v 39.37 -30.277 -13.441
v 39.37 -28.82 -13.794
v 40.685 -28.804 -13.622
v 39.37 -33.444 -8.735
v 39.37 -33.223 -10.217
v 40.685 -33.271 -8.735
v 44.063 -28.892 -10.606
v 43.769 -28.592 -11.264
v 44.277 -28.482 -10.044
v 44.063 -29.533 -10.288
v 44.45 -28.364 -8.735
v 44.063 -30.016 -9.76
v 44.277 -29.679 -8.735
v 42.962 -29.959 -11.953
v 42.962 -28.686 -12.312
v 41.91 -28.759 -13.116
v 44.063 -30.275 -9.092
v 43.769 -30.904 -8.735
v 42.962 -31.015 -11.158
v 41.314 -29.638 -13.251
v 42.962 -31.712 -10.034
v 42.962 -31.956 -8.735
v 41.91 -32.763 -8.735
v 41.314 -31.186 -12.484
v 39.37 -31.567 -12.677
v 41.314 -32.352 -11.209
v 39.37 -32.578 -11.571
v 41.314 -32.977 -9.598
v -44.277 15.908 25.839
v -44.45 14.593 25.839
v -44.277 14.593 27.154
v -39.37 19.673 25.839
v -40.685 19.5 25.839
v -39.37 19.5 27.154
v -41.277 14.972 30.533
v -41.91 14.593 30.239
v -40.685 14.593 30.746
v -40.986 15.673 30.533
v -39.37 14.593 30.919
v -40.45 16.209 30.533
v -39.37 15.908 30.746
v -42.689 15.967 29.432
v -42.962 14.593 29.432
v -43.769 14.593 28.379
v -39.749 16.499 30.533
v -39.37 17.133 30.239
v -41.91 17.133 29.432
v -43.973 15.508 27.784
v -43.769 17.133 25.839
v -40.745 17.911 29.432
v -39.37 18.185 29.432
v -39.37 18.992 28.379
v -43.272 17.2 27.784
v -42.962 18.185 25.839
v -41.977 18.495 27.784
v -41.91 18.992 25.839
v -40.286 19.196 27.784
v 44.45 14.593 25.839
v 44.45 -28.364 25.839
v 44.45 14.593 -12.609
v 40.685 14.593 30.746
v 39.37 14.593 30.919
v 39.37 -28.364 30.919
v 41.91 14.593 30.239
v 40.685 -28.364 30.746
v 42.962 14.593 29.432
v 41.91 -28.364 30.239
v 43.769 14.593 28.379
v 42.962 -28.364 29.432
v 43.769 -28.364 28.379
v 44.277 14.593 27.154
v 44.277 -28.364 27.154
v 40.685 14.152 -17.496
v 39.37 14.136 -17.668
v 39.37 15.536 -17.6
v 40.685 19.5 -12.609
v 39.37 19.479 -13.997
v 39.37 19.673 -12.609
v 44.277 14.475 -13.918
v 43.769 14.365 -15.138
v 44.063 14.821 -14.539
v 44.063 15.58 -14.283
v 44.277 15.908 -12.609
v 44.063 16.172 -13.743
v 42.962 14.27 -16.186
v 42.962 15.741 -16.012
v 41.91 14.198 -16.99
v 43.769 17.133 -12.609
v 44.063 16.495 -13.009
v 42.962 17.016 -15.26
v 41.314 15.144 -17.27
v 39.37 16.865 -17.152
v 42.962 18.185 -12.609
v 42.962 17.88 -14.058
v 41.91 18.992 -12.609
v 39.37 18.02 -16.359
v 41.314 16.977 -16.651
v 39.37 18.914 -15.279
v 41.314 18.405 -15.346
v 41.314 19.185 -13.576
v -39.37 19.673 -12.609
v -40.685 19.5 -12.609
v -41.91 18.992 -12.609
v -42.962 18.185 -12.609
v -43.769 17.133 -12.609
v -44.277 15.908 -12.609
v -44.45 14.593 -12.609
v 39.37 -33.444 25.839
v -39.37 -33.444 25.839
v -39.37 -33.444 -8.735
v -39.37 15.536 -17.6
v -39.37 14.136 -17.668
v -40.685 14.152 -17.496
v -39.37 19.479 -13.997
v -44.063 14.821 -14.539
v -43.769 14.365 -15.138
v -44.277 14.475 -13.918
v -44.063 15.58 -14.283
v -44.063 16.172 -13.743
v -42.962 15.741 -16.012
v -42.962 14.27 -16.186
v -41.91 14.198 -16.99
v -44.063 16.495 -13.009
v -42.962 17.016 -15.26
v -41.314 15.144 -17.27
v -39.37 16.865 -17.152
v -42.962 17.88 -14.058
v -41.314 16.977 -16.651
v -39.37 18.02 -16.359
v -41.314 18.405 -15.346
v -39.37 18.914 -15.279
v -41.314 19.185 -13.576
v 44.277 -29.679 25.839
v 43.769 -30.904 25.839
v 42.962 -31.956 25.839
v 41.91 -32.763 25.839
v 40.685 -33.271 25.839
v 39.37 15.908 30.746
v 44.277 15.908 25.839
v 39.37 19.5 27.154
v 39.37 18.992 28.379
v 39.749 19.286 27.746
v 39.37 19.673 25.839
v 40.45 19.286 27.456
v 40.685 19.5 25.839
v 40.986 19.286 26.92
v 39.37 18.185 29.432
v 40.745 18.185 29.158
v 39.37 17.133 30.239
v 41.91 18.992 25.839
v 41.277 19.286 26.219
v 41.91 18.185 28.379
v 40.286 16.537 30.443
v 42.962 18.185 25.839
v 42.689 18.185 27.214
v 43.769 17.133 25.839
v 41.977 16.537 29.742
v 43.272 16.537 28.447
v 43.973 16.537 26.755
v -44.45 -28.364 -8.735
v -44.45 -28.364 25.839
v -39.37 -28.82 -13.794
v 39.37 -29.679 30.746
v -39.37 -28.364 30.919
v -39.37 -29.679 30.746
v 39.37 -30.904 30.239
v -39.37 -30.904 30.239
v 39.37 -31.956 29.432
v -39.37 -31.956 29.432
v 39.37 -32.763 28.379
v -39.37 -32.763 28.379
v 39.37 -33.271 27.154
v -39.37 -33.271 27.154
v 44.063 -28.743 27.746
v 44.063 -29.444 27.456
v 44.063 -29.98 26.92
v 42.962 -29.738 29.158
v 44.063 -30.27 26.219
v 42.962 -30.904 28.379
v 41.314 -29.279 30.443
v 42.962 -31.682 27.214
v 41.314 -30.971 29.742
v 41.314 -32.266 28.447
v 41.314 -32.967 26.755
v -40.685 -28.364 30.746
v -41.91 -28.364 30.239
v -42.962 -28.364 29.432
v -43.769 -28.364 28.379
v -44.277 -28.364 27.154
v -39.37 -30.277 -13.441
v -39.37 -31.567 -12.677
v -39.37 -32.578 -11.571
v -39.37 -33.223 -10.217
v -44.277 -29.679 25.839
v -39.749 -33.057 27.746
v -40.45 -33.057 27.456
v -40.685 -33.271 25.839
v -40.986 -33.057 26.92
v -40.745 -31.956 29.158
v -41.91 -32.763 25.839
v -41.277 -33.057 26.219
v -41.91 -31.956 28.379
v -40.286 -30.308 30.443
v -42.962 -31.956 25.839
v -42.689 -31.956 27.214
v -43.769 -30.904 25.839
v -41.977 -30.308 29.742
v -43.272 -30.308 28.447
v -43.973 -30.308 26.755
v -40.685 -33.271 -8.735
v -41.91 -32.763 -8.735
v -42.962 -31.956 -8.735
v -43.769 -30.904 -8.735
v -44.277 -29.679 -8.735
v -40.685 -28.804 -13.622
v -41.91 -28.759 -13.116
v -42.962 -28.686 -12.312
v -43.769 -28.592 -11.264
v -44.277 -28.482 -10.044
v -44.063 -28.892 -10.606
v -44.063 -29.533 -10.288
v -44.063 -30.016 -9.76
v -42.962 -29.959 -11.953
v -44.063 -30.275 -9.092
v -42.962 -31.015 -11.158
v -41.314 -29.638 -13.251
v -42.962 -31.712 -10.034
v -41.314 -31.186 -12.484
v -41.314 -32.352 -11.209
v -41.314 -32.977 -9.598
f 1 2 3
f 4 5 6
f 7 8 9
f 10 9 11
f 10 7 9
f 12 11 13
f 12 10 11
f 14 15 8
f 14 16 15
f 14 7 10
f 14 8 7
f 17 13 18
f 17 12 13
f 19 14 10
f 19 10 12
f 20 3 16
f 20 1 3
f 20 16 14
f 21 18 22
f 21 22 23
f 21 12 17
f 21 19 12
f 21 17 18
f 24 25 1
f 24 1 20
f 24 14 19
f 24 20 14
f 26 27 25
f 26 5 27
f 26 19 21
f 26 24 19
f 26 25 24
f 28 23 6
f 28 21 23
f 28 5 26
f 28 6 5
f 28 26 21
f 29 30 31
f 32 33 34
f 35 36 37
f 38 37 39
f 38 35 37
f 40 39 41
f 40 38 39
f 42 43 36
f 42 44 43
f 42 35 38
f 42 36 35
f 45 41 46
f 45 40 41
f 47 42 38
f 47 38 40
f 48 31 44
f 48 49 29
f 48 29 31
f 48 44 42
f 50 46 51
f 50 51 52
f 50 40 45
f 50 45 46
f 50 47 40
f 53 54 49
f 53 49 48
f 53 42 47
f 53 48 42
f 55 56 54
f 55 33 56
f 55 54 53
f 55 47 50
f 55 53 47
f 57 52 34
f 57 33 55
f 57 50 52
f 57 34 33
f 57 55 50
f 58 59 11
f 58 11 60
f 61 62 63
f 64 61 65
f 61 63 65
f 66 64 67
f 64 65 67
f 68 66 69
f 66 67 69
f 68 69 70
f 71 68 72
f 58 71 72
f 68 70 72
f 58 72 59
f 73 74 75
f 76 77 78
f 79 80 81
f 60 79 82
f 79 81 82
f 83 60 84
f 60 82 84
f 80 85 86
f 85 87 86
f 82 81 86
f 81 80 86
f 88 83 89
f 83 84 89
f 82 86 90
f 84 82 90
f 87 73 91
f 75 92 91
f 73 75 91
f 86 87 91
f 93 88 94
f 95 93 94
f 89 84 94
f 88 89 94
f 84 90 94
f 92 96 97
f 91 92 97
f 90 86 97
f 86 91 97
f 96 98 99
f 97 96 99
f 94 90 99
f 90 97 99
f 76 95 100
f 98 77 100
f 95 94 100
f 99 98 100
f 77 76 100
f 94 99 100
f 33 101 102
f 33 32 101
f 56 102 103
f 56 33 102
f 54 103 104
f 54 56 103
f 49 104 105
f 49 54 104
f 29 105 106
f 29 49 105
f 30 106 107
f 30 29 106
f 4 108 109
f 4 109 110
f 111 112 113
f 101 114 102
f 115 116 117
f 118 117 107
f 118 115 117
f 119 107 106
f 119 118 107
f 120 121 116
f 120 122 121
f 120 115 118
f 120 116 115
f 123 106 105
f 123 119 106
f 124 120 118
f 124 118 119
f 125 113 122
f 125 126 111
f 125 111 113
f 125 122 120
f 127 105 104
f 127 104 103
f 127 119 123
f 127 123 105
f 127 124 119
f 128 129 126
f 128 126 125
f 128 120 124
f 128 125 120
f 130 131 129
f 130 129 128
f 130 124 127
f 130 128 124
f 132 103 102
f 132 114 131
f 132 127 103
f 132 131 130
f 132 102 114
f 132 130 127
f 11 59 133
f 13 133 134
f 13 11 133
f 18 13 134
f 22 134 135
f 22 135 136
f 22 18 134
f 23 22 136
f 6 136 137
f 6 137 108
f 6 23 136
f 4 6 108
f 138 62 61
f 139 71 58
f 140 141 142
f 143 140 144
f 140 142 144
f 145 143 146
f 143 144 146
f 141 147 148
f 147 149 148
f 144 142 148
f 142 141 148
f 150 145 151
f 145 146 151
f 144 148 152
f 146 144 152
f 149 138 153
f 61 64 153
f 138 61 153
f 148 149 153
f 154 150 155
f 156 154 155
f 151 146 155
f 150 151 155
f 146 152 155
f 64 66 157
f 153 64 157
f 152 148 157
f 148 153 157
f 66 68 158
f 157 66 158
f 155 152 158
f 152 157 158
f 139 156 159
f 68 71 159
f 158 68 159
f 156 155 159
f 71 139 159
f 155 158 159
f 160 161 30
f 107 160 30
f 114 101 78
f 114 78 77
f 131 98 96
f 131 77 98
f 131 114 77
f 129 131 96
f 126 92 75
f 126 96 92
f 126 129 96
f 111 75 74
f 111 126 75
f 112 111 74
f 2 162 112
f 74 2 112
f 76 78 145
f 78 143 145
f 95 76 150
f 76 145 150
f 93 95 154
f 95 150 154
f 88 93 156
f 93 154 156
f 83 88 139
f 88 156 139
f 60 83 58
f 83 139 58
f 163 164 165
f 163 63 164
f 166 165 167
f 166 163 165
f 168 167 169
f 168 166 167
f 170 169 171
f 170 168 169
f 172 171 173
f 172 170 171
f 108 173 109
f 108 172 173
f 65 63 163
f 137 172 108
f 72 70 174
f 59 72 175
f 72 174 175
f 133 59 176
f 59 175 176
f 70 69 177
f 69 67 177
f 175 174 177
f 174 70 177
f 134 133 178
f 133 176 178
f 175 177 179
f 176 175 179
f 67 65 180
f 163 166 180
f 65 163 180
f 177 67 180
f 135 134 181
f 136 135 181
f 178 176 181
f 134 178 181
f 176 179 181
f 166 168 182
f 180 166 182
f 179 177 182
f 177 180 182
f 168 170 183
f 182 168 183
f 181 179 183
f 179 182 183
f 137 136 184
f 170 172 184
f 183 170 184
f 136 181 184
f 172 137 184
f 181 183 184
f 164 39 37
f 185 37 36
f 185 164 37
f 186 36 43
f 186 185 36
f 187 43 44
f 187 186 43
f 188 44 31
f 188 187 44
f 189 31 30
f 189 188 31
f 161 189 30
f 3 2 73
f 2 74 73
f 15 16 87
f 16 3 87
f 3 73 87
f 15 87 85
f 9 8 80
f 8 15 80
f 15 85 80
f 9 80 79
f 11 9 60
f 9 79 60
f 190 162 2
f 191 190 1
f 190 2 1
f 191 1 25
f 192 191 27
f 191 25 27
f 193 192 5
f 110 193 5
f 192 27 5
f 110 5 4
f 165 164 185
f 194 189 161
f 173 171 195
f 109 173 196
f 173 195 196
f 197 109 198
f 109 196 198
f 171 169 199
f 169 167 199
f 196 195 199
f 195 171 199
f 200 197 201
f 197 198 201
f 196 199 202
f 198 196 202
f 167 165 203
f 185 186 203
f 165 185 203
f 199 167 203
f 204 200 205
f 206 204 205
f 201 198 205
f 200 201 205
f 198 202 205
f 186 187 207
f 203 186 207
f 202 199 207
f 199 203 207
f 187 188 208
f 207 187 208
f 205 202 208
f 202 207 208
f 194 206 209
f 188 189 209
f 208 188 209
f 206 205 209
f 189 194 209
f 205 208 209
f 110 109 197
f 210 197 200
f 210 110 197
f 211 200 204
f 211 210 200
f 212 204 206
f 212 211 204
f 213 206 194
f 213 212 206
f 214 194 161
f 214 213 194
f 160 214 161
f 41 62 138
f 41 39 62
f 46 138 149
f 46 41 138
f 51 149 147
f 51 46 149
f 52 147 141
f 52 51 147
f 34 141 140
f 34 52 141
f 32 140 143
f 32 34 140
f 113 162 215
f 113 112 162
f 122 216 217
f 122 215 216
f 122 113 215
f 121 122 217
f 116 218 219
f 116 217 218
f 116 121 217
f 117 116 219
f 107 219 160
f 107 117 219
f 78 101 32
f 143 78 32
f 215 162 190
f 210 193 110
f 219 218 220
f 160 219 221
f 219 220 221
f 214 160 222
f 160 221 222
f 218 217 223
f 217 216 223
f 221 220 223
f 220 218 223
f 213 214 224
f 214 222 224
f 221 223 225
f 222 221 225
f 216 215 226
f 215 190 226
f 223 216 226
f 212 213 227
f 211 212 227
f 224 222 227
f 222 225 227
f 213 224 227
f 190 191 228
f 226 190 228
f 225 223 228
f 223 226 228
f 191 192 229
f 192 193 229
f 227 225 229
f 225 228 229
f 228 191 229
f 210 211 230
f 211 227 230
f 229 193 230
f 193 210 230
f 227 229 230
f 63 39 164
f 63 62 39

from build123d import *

# Parameters (mm, degrees)
F1_DEPTH = 44.45
F3_R     = 5.08


# Not quite as in the source:
# - a feature of the source that left no trace in its solid (it failed there, or was rolled back) is left out


with BuildPart() as f1:
    # F0 (on Right) → F1 (new body, symmetric)
    with BuildSketch(Plane.YZ):
        Polygon((19.6727830917, 30.9194792062), (-33.4437340498, 30.9194792062), (-33.4437340498, -13.377064839), (19.6727830917, -18.1674808264), align=None)
    extrude(amount=F1_DEPTH, both=True)

    # F3
    f3_edges = [f1.edges().sort_by_distance(p)[0] for p in [
        (-44.45, 19.672783, 6.375999),
        (-44.45, -6.885475, 30.919479),
        (0, -33.443734, 30.919479),
        (44.45, -6.885475, 30.919479),
        (0, 19.672783, 30.919479),
        (44.45, 19.672783, 6.375999),
        (0, 19.672783, -18.167481),
        (0, -33.443734, -13.377065),
        (-44.45, -6.885475, -15.772273),
        (44.45, -6.885475, -15.772273),
        (44.45, -33.443734, 8.771207),
        (-44.45, -33.443734, 8.771207),
    ]]
    fillet(f3_edges, radius=F3_R)


solid = f1.part
